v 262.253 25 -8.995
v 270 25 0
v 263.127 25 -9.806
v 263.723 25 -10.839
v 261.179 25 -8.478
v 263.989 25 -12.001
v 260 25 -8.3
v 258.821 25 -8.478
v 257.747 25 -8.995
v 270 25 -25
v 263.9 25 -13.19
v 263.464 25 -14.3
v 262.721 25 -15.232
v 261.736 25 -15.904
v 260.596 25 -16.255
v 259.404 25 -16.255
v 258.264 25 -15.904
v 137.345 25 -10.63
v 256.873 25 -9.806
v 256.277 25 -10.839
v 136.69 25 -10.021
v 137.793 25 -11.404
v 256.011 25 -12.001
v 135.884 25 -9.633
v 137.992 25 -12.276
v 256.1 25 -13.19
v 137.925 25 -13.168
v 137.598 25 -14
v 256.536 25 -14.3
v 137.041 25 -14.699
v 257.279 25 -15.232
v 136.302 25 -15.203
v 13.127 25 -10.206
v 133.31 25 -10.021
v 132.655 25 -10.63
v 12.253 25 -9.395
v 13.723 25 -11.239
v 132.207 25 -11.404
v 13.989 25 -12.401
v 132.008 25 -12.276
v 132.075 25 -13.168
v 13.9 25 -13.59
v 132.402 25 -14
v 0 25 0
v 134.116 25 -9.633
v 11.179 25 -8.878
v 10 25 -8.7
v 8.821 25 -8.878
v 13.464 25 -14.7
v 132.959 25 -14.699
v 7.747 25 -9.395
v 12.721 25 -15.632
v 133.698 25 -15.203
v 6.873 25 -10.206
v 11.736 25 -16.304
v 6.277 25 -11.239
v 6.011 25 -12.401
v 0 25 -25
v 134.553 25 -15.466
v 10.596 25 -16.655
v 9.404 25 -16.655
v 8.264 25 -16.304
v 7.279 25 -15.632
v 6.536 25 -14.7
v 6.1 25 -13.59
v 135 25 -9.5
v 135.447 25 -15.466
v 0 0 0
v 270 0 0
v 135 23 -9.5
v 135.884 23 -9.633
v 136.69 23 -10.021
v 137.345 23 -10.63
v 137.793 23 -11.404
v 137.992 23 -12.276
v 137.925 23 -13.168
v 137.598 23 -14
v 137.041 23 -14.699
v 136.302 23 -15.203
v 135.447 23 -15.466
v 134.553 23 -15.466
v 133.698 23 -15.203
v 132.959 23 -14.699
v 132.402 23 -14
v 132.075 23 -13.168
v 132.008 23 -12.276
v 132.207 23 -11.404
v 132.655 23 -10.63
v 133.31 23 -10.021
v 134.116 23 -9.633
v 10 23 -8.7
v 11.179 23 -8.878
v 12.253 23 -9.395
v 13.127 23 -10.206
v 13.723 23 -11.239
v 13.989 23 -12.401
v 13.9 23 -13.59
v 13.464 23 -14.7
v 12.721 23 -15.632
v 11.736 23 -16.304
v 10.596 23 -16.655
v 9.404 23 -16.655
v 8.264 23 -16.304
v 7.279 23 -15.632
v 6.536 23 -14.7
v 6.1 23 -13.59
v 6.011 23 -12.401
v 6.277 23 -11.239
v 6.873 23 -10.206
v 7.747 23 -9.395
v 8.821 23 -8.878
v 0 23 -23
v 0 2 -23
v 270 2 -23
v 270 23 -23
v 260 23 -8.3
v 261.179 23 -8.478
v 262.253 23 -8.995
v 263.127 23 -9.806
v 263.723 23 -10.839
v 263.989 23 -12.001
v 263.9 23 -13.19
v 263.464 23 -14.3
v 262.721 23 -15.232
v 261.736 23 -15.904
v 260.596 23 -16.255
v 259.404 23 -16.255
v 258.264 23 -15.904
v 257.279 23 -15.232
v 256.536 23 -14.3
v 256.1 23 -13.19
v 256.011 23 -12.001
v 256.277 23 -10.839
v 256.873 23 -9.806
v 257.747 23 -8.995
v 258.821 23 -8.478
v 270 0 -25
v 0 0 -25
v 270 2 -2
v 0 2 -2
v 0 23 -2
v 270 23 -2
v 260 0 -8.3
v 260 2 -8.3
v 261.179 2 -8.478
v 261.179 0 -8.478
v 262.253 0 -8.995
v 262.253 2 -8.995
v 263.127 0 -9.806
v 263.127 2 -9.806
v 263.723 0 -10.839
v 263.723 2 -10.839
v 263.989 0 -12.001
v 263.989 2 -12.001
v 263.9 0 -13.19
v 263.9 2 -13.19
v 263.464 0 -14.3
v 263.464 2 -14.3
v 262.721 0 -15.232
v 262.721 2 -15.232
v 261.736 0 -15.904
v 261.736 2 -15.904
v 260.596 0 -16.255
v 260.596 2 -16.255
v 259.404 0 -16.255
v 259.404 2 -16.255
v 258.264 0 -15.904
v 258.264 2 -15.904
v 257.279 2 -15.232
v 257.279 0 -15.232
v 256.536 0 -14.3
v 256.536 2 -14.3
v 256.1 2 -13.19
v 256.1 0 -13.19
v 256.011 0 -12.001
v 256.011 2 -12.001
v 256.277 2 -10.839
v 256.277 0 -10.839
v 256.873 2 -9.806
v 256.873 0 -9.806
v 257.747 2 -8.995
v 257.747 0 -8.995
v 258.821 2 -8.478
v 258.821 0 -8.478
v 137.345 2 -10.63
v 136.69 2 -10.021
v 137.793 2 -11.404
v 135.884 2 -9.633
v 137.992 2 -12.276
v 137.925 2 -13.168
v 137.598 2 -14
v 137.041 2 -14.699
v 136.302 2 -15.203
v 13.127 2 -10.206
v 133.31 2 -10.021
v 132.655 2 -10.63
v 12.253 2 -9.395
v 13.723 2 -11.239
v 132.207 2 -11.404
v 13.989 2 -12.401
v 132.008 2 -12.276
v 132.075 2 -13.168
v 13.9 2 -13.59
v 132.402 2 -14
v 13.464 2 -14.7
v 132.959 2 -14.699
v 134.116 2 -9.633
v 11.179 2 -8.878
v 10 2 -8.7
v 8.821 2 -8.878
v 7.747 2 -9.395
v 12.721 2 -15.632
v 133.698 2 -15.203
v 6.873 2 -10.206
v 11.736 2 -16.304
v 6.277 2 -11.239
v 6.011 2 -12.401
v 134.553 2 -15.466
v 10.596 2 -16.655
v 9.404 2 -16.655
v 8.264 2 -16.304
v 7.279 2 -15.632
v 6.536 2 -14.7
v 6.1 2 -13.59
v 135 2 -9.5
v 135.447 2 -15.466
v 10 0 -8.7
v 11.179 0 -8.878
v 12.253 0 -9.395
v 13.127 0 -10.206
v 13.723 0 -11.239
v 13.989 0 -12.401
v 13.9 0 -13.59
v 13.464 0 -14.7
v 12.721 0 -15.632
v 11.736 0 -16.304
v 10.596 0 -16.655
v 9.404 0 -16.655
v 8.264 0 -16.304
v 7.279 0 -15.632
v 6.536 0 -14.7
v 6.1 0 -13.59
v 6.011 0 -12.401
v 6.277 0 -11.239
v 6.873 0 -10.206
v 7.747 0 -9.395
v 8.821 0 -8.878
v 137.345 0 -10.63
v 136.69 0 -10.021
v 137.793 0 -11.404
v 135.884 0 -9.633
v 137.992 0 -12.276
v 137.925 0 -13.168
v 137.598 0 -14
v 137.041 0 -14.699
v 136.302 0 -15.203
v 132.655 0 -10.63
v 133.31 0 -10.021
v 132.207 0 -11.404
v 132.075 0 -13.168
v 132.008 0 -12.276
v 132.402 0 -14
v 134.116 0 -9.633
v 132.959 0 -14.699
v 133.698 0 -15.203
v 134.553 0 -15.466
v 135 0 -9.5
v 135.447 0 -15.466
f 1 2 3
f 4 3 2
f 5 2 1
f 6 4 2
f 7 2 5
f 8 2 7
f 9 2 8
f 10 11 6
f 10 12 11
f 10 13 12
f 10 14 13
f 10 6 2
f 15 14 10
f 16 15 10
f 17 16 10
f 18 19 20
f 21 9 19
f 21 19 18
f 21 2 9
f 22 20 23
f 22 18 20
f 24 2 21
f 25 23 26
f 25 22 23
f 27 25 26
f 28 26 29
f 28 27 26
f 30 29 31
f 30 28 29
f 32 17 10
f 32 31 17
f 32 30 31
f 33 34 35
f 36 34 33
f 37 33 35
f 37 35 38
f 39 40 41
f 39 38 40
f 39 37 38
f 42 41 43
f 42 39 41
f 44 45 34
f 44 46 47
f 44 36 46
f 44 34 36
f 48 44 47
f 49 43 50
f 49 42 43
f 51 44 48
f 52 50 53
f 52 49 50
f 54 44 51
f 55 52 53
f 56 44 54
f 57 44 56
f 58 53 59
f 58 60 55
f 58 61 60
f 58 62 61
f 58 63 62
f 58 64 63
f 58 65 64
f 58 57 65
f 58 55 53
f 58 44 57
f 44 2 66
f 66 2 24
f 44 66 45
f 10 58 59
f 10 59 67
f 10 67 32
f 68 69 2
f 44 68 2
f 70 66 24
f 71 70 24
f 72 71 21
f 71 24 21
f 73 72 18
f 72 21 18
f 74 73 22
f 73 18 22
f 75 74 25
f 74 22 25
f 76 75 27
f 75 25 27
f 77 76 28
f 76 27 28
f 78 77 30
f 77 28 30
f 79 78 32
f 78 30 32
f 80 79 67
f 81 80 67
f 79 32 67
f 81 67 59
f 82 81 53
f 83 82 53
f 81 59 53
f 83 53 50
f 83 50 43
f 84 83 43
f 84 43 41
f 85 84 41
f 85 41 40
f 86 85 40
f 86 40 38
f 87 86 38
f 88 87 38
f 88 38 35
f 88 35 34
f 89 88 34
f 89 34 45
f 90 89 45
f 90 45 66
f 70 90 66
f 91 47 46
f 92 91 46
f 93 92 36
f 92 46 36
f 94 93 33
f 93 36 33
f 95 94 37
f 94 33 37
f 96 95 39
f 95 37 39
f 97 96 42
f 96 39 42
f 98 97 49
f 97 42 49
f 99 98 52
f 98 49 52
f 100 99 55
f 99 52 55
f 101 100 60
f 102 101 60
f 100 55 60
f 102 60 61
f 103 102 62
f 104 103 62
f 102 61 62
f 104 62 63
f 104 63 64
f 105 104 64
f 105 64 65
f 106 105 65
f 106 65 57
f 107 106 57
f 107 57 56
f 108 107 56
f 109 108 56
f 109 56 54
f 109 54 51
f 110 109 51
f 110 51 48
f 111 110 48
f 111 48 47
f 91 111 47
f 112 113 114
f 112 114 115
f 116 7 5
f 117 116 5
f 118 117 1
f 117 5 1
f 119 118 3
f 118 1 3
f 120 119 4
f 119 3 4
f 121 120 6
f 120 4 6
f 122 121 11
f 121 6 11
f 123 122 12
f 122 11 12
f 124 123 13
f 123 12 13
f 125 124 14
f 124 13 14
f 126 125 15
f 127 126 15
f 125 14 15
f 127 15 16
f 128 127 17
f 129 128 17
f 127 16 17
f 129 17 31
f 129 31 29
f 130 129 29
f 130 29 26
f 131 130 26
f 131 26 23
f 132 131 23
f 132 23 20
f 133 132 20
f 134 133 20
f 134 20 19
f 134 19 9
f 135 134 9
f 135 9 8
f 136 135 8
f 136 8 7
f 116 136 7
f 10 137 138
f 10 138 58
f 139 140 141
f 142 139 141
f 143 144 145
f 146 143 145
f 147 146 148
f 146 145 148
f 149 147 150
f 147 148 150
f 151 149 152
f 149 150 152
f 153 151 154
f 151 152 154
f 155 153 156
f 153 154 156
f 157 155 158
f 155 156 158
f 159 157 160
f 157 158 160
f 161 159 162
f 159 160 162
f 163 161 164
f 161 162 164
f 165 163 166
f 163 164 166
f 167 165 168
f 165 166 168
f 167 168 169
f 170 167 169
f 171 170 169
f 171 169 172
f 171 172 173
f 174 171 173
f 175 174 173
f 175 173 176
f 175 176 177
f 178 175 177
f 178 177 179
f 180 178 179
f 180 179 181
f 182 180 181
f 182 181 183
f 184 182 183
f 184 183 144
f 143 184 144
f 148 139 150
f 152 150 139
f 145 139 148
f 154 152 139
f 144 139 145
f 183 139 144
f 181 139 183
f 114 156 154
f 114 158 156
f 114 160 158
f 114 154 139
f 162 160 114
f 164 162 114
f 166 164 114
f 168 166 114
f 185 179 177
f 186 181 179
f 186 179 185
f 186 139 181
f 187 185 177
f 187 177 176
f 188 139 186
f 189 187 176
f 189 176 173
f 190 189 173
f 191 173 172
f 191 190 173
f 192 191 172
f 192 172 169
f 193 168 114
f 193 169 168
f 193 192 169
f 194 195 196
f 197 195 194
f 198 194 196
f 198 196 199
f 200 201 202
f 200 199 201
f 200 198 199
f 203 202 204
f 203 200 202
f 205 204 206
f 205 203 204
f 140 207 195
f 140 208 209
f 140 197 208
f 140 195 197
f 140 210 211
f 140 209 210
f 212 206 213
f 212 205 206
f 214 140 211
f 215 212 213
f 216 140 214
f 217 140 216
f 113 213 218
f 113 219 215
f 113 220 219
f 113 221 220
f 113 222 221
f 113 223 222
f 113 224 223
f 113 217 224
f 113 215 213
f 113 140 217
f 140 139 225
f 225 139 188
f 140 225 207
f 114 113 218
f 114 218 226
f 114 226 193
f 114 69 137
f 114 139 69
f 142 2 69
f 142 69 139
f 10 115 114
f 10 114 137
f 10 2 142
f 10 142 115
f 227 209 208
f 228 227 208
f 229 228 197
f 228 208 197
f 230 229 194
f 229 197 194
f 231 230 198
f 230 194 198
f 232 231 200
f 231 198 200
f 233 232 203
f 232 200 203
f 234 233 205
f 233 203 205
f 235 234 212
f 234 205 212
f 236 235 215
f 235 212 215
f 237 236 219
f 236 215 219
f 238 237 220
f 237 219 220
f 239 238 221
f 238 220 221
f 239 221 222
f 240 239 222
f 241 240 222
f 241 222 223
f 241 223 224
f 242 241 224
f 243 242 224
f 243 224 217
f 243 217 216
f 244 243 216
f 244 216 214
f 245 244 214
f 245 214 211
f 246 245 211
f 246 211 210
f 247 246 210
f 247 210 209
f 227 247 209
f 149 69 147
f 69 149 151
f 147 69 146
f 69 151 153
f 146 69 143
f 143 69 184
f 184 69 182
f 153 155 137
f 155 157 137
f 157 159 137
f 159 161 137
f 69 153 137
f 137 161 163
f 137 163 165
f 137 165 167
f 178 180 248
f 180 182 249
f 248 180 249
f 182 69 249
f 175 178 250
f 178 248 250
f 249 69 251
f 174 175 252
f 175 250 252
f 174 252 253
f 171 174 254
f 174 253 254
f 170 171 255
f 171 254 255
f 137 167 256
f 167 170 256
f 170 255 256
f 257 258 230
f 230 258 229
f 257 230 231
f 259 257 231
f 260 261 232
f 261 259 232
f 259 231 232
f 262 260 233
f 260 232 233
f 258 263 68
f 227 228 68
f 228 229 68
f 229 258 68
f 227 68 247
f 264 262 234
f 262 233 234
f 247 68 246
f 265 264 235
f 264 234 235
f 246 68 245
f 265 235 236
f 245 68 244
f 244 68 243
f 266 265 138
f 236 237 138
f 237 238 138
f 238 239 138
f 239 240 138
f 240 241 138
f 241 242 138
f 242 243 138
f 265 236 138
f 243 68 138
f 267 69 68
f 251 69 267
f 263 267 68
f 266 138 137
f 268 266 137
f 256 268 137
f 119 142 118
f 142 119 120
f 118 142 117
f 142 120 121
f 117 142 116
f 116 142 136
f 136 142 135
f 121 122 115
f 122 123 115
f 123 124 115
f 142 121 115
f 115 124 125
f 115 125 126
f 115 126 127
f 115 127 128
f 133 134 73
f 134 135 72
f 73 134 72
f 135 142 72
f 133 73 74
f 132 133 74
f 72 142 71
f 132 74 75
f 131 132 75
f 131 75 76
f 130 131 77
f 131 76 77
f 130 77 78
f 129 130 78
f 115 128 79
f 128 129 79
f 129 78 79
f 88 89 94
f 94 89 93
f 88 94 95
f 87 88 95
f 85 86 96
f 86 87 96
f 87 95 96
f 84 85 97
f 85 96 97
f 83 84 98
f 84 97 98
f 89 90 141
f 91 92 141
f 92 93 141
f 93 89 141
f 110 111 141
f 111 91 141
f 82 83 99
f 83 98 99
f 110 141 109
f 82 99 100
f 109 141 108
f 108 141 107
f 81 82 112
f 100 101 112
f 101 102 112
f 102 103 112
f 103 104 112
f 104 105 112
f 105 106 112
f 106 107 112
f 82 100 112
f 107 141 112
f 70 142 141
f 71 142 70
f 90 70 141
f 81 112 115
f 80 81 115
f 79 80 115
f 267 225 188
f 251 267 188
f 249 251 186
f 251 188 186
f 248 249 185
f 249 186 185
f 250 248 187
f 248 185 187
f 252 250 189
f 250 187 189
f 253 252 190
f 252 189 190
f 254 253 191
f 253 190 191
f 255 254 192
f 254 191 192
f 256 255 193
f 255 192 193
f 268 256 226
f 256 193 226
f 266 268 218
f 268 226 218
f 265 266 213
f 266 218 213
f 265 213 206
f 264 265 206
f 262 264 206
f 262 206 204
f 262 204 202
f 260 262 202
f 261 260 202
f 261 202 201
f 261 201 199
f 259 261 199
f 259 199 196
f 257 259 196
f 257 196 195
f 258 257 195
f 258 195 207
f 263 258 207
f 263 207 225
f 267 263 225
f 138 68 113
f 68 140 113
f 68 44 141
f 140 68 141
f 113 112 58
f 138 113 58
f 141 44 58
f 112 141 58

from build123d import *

# Parameters (mm, degrees)
SKETCH1_W           = 25
SKETCH1_H           = 25
SKETCH1_W_2         = 21
SKETCH1_H_2         = 21
BOSS_EXTRUDE1_DEPTH = 270
SKETCH2_R           = 3
CUT_EXTRUDE1_DEPTH  = 273.304976084
SKETCH3_R           = 4
CUT_EXTRUDE2_DEPTH  = 273.304976084


with BuildPart() as part:
    # Sketch1 → Boss-Extrude1 (new body)
    with BuildSketch(Plane(origin=(0, 0, 0), x_dir=(0, 0, -1), z_dir=(1, 0, 0))):
        with Locations((12.5, 12.5)):
            Rectangle(SKETCH1_W, SKETCH1_H)
        with Locations((12.5, 12.5)):
            Rectangle(SKETCH1_W_2, SKETCH1_H_2, mode=Mode.SUBTRACT)
    extrude(amount=BOSS_EXTRUDE1_DEPTH)

    # Sketch2 → Cut-Extrude1 (cut, through all)
    with BuildSketch(Plane(origin=(0, 25, 0), x_dir=(1, 0, 0), z_dir=(0, 1, 0))):
        with Locations(Location((135, 12.5, 0), (0, 0, 270))):
            Circle(SKETCH2_R)
    extrude(amount=-CUT_EXTRUDE1_DEPTH, mode=Mode.SUBTRACT)

    # Sketch3 → Cut-Extrude2 (cut, through all)
    with BuildSketch(Plane(origin=(0, 25, 0), x_dir=(1, 0, 0), z_dir=(0, 1, 0))):
        with Locations(Location((10, 12.7, 0), (0, 0, 270))):
            Circle(SKETCH3_R)
        with Locations(Location((260, 12.3, 0), (0, 0, 270))):
            Circle(SKETCH3_R)
    extrude(amount=-CUT_EXTRUDE2_DEPTH, mode=Mode.SUBTRACT)


solid = part.part
